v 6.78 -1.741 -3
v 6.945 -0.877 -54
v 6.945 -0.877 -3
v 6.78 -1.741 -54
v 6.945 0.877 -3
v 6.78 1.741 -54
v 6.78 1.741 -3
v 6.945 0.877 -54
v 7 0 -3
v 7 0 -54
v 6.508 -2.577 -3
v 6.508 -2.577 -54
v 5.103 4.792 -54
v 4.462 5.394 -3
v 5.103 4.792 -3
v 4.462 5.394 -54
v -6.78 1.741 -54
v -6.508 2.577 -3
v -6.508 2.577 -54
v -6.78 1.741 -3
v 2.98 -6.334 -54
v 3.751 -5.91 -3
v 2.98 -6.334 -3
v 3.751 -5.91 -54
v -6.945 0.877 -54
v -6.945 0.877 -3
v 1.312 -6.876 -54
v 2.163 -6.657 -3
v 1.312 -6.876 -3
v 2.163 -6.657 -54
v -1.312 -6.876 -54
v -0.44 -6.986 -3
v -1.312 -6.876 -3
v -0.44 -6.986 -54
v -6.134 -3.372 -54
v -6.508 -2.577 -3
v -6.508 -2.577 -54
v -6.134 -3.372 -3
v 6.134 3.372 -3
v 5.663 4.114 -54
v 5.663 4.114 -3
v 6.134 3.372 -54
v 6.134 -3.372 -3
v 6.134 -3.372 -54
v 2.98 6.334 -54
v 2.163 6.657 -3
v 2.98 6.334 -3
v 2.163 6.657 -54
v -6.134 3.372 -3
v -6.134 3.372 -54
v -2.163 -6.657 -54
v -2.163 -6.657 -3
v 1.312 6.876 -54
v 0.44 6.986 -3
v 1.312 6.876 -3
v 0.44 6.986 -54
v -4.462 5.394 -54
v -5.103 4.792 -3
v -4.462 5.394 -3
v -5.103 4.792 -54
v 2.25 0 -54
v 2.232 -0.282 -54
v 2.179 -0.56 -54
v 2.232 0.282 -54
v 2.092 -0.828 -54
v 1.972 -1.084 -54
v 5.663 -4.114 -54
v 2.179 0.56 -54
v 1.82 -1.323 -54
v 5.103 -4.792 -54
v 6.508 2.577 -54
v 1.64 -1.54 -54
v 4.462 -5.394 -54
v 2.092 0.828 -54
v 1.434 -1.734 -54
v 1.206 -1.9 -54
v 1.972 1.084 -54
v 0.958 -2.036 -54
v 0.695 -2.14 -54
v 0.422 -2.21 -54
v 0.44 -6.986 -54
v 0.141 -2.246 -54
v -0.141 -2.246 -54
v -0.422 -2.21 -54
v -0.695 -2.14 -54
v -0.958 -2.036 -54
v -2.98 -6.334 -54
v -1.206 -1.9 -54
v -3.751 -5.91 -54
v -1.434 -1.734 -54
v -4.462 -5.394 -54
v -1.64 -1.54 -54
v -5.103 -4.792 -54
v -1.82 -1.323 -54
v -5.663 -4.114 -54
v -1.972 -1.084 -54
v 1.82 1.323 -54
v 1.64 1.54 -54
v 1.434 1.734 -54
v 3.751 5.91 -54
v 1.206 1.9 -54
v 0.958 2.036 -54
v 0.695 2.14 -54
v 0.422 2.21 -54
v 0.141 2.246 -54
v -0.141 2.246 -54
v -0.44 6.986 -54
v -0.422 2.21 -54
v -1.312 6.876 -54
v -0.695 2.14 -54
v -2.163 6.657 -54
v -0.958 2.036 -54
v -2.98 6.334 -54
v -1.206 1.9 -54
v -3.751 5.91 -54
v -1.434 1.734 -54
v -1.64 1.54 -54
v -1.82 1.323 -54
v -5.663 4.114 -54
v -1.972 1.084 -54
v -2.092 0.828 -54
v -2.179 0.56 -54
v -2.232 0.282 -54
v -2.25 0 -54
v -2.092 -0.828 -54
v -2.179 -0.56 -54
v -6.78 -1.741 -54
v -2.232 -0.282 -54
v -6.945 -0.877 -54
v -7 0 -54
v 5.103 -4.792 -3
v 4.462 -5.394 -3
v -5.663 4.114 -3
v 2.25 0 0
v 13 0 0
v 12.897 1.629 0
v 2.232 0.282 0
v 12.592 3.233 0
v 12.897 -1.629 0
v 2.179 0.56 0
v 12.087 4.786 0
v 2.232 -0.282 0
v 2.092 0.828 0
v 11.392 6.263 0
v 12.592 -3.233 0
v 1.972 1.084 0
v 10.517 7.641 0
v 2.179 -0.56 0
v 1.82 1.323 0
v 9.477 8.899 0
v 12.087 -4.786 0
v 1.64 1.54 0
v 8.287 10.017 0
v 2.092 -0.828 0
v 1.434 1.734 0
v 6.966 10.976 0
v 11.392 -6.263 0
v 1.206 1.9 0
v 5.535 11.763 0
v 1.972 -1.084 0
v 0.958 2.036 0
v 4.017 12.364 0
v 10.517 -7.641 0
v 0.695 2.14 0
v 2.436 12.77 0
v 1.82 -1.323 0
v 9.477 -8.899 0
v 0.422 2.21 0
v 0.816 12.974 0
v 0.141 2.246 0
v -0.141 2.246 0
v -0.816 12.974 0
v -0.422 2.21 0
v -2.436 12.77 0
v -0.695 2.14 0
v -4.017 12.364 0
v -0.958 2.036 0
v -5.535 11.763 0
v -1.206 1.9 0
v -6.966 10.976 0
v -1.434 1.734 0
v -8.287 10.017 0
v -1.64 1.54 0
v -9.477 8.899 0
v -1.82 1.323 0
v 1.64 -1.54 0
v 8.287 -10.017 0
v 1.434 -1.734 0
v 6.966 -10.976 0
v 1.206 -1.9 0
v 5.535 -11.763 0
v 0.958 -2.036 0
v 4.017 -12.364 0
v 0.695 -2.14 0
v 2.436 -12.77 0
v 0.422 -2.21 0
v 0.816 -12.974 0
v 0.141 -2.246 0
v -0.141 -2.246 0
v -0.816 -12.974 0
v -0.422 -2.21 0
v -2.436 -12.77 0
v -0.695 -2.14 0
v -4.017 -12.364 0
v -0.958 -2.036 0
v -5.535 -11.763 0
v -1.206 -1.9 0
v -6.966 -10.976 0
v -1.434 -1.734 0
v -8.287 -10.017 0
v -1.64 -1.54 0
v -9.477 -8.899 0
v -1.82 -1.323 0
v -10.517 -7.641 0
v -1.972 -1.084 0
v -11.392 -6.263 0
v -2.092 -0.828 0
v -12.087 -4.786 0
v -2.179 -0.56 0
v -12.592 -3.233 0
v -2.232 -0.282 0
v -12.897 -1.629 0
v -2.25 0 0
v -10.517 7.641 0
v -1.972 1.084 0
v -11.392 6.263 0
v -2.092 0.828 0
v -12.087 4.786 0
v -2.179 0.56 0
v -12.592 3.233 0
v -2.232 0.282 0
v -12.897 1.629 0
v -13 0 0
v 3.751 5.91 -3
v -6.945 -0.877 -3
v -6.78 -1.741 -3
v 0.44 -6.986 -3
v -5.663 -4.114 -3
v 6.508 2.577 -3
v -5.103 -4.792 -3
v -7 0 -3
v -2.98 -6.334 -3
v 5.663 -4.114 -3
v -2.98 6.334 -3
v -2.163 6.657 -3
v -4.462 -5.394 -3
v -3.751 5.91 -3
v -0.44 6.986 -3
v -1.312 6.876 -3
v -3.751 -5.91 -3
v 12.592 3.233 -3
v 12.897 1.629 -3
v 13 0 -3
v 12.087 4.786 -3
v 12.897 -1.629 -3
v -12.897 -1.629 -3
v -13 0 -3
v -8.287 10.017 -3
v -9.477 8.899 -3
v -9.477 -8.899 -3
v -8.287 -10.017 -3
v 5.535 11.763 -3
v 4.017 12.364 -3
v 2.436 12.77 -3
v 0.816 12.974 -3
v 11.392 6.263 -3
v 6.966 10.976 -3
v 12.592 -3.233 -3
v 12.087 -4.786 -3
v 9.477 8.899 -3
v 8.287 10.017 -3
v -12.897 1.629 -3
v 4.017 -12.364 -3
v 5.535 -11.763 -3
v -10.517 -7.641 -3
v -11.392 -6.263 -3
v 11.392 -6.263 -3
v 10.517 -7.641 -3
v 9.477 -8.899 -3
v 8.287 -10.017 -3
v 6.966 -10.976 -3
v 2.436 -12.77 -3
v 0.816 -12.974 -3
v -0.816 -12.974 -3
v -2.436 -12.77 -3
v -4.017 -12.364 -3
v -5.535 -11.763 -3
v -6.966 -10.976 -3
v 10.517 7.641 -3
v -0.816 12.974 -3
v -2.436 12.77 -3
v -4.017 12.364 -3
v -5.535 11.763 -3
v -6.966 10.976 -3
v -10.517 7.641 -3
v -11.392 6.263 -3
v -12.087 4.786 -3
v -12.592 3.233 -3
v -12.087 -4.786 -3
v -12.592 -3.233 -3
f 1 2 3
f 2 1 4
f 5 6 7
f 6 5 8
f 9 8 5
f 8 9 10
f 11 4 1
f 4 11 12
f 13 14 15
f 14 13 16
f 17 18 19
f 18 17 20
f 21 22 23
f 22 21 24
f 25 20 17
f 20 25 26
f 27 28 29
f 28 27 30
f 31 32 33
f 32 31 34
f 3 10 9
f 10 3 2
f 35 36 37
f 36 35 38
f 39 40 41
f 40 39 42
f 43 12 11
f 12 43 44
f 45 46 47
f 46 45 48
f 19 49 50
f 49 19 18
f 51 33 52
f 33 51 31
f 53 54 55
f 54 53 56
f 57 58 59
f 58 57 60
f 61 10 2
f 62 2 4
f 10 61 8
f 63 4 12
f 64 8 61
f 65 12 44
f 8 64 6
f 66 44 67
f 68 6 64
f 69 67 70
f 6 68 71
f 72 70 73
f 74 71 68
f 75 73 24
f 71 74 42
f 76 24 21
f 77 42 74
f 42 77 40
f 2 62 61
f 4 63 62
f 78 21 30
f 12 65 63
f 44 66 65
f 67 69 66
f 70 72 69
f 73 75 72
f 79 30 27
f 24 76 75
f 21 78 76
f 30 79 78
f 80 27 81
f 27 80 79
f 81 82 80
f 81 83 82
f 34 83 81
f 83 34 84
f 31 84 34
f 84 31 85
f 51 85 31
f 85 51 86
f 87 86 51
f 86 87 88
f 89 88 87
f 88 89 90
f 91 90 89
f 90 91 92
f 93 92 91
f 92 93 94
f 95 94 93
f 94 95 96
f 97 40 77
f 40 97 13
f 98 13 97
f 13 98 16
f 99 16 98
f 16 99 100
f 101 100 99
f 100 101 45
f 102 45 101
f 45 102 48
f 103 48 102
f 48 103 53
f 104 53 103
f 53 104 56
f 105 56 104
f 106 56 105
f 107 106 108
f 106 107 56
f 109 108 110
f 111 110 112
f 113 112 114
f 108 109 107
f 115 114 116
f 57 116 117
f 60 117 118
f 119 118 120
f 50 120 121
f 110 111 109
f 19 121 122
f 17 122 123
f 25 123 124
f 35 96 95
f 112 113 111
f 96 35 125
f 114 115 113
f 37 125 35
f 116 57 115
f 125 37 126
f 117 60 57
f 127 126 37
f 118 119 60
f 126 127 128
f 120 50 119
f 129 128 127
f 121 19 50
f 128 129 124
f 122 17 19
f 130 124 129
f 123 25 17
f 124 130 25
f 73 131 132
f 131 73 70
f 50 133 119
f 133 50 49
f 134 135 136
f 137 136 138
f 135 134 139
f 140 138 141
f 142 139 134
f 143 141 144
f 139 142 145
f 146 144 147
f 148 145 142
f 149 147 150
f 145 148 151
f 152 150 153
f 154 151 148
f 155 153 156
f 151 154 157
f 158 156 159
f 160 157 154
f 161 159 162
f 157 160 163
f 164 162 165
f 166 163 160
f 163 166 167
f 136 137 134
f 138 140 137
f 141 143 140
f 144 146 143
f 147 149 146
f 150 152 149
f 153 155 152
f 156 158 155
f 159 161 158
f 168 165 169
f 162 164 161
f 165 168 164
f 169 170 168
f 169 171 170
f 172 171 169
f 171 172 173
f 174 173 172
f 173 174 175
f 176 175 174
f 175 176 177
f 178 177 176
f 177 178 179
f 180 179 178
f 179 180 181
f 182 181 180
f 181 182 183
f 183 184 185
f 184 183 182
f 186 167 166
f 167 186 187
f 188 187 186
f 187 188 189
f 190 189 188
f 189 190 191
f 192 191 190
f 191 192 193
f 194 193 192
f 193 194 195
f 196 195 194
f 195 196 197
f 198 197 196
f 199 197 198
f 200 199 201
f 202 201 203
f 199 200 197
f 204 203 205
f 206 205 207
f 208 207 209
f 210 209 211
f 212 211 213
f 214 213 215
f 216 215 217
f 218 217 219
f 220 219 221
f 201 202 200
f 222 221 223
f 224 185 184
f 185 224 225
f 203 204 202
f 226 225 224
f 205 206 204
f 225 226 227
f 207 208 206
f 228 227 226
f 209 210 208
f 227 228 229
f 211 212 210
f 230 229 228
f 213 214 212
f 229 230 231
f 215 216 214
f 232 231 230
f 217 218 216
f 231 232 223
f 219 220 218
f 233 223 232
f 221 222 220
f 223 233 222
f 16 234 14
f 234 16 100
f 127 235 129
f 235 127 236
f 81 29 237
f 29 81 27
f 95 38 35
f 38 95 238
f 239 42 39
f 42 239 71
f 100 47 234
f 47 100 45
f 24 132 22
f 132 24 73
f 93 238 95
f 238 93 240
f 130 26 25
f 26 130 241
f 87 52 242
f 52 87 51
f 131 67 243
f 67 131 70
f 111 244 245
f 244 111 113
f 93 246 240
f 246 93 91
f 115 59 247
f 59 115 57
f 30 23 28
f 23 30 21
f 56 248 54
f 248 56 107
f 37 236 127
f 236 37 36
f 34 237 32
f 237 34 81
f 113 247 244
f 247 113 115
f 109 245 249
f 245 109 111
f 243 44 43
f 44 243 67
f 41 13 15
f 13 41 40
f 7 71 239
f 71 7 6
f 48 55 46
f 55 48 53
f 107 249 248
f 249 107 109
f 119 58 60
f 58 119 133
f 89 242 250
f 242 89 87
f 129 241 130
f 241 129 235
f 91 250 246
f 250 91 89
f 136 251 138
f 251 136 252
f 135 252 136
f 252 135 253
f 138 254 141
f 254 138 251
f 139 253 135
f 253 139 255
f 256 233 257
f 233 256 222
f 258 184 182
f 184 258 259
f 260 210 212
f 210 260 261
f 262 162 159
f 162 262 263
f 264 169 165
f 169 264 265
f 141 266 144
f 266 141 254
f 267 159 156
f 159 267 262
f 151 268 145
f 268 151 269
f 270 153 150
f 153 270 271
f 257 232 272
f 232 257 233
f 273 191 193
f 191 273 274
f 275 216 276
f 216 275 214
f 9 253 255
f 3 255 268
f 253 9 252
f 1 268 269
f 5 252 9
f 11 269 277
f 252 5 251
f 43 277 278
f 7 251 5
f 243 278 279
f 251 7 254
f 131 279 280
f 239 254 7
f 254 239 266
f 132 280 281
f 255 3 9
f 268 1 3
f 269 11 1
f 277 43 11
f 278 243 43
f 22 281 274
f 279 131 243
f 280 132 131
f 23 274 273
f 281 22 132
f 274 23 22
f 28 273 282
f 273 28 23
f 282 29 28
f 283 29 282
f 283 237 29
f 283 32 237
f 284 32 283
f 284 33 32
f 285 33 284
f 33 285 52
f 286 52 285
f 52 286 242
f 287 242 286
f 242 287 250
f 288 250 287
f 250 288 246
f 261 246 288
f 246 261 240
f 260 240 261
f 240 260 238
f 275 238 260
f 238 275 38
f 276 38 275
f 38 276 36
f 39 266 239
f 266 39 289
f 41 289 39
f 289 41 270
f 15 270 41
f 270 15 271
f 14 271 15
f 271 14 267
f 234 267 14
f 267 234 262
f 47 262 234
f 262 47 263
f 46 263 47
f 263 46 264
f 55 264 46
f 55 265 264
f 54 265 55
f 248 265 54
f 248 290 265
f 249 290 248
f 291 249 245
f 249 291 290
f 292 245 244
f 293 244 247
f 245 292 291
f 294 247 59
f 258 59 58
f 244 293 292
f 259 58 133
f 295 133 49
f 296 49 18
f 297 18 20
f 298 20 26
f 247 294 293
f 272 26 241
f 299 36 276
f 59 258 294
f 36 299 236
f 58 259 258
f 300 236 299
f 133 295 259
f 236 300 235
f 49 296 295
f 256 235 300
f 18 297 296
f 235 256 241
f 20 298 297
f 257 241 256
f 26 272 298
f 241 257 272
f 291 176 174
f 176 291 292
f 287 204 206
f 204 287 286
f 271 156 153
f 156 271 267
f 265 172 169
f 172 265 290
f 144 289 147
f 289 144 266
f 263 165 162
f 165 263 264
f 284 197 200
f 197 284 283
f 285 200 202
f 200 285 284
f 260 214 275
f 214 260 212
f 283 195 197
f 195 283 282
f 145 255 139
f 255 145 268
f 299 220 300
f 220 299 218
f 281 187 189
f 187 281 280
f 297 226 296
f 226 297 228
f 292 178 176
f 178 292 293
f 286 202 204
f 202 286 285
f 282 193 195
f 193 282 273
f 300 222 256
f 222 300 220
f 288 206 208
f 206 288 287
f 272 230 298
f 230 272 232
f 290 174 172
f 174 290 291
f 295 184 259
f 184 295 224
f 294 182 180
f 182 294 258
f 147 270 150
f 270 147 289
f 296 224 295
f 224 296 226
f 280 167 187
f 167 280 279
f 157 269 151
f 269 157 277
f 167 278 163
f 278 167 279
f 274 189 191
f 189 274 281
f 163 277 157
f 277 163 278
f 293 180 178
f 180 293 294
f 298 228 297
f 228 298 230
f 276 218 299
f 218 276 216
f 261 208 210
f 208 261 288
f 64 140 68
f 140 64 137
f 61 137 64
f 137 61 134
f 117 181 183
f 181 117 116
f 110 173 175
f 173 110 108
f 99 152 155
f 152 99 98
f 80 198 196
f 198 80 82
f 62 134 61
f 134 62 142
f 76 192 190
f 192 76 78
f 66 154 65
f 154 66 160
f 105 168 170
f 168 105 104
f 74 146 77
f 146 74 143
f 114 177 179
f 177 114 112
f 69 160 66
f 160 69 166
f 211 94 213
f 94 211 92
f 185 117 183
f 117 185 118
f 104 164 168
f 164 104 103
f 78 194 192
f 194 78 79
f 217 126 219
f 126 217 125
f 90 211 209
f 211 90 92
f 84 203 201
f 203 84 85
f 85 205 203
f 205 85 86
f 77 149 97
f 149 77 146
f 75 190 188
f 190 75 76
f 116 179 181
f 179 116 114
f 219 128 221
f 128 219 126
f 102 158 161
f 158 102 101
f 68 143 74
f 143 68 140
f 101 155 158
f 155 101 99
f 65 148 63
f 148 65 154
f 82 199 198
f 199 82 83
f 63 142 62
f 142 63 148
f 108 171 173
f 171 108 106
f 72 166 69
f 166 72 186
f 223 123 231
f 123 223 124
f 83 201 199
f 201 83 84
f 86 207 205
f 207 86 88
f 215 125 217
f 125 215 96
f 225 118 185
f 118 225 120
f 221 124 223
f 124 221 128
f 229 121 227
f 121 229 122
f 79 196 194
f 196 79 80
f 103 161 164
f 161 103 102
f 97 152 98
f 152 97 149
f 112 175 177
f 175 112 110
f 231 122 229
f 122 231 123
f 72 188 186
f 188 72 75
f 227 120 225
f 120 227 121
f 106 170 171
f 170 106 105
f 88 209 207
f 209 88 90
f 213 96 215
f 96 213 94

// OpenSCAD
$fn = 50;


difference() {
	union() {
		translate(v = [0, 0, -54.0000000000]) {
			cylinder(h = 54, r = 7.0000000000);
		}
		translate(v = [0, 0, -3.0000000000]) {
			cylinder(h = 3, r = 13.0000000000);
		}
	}
	union() {
		#translate(v = [0, 0, -54]) {
			cylinder(h = 54, r = 2.2500000000);
		}
	}
}
